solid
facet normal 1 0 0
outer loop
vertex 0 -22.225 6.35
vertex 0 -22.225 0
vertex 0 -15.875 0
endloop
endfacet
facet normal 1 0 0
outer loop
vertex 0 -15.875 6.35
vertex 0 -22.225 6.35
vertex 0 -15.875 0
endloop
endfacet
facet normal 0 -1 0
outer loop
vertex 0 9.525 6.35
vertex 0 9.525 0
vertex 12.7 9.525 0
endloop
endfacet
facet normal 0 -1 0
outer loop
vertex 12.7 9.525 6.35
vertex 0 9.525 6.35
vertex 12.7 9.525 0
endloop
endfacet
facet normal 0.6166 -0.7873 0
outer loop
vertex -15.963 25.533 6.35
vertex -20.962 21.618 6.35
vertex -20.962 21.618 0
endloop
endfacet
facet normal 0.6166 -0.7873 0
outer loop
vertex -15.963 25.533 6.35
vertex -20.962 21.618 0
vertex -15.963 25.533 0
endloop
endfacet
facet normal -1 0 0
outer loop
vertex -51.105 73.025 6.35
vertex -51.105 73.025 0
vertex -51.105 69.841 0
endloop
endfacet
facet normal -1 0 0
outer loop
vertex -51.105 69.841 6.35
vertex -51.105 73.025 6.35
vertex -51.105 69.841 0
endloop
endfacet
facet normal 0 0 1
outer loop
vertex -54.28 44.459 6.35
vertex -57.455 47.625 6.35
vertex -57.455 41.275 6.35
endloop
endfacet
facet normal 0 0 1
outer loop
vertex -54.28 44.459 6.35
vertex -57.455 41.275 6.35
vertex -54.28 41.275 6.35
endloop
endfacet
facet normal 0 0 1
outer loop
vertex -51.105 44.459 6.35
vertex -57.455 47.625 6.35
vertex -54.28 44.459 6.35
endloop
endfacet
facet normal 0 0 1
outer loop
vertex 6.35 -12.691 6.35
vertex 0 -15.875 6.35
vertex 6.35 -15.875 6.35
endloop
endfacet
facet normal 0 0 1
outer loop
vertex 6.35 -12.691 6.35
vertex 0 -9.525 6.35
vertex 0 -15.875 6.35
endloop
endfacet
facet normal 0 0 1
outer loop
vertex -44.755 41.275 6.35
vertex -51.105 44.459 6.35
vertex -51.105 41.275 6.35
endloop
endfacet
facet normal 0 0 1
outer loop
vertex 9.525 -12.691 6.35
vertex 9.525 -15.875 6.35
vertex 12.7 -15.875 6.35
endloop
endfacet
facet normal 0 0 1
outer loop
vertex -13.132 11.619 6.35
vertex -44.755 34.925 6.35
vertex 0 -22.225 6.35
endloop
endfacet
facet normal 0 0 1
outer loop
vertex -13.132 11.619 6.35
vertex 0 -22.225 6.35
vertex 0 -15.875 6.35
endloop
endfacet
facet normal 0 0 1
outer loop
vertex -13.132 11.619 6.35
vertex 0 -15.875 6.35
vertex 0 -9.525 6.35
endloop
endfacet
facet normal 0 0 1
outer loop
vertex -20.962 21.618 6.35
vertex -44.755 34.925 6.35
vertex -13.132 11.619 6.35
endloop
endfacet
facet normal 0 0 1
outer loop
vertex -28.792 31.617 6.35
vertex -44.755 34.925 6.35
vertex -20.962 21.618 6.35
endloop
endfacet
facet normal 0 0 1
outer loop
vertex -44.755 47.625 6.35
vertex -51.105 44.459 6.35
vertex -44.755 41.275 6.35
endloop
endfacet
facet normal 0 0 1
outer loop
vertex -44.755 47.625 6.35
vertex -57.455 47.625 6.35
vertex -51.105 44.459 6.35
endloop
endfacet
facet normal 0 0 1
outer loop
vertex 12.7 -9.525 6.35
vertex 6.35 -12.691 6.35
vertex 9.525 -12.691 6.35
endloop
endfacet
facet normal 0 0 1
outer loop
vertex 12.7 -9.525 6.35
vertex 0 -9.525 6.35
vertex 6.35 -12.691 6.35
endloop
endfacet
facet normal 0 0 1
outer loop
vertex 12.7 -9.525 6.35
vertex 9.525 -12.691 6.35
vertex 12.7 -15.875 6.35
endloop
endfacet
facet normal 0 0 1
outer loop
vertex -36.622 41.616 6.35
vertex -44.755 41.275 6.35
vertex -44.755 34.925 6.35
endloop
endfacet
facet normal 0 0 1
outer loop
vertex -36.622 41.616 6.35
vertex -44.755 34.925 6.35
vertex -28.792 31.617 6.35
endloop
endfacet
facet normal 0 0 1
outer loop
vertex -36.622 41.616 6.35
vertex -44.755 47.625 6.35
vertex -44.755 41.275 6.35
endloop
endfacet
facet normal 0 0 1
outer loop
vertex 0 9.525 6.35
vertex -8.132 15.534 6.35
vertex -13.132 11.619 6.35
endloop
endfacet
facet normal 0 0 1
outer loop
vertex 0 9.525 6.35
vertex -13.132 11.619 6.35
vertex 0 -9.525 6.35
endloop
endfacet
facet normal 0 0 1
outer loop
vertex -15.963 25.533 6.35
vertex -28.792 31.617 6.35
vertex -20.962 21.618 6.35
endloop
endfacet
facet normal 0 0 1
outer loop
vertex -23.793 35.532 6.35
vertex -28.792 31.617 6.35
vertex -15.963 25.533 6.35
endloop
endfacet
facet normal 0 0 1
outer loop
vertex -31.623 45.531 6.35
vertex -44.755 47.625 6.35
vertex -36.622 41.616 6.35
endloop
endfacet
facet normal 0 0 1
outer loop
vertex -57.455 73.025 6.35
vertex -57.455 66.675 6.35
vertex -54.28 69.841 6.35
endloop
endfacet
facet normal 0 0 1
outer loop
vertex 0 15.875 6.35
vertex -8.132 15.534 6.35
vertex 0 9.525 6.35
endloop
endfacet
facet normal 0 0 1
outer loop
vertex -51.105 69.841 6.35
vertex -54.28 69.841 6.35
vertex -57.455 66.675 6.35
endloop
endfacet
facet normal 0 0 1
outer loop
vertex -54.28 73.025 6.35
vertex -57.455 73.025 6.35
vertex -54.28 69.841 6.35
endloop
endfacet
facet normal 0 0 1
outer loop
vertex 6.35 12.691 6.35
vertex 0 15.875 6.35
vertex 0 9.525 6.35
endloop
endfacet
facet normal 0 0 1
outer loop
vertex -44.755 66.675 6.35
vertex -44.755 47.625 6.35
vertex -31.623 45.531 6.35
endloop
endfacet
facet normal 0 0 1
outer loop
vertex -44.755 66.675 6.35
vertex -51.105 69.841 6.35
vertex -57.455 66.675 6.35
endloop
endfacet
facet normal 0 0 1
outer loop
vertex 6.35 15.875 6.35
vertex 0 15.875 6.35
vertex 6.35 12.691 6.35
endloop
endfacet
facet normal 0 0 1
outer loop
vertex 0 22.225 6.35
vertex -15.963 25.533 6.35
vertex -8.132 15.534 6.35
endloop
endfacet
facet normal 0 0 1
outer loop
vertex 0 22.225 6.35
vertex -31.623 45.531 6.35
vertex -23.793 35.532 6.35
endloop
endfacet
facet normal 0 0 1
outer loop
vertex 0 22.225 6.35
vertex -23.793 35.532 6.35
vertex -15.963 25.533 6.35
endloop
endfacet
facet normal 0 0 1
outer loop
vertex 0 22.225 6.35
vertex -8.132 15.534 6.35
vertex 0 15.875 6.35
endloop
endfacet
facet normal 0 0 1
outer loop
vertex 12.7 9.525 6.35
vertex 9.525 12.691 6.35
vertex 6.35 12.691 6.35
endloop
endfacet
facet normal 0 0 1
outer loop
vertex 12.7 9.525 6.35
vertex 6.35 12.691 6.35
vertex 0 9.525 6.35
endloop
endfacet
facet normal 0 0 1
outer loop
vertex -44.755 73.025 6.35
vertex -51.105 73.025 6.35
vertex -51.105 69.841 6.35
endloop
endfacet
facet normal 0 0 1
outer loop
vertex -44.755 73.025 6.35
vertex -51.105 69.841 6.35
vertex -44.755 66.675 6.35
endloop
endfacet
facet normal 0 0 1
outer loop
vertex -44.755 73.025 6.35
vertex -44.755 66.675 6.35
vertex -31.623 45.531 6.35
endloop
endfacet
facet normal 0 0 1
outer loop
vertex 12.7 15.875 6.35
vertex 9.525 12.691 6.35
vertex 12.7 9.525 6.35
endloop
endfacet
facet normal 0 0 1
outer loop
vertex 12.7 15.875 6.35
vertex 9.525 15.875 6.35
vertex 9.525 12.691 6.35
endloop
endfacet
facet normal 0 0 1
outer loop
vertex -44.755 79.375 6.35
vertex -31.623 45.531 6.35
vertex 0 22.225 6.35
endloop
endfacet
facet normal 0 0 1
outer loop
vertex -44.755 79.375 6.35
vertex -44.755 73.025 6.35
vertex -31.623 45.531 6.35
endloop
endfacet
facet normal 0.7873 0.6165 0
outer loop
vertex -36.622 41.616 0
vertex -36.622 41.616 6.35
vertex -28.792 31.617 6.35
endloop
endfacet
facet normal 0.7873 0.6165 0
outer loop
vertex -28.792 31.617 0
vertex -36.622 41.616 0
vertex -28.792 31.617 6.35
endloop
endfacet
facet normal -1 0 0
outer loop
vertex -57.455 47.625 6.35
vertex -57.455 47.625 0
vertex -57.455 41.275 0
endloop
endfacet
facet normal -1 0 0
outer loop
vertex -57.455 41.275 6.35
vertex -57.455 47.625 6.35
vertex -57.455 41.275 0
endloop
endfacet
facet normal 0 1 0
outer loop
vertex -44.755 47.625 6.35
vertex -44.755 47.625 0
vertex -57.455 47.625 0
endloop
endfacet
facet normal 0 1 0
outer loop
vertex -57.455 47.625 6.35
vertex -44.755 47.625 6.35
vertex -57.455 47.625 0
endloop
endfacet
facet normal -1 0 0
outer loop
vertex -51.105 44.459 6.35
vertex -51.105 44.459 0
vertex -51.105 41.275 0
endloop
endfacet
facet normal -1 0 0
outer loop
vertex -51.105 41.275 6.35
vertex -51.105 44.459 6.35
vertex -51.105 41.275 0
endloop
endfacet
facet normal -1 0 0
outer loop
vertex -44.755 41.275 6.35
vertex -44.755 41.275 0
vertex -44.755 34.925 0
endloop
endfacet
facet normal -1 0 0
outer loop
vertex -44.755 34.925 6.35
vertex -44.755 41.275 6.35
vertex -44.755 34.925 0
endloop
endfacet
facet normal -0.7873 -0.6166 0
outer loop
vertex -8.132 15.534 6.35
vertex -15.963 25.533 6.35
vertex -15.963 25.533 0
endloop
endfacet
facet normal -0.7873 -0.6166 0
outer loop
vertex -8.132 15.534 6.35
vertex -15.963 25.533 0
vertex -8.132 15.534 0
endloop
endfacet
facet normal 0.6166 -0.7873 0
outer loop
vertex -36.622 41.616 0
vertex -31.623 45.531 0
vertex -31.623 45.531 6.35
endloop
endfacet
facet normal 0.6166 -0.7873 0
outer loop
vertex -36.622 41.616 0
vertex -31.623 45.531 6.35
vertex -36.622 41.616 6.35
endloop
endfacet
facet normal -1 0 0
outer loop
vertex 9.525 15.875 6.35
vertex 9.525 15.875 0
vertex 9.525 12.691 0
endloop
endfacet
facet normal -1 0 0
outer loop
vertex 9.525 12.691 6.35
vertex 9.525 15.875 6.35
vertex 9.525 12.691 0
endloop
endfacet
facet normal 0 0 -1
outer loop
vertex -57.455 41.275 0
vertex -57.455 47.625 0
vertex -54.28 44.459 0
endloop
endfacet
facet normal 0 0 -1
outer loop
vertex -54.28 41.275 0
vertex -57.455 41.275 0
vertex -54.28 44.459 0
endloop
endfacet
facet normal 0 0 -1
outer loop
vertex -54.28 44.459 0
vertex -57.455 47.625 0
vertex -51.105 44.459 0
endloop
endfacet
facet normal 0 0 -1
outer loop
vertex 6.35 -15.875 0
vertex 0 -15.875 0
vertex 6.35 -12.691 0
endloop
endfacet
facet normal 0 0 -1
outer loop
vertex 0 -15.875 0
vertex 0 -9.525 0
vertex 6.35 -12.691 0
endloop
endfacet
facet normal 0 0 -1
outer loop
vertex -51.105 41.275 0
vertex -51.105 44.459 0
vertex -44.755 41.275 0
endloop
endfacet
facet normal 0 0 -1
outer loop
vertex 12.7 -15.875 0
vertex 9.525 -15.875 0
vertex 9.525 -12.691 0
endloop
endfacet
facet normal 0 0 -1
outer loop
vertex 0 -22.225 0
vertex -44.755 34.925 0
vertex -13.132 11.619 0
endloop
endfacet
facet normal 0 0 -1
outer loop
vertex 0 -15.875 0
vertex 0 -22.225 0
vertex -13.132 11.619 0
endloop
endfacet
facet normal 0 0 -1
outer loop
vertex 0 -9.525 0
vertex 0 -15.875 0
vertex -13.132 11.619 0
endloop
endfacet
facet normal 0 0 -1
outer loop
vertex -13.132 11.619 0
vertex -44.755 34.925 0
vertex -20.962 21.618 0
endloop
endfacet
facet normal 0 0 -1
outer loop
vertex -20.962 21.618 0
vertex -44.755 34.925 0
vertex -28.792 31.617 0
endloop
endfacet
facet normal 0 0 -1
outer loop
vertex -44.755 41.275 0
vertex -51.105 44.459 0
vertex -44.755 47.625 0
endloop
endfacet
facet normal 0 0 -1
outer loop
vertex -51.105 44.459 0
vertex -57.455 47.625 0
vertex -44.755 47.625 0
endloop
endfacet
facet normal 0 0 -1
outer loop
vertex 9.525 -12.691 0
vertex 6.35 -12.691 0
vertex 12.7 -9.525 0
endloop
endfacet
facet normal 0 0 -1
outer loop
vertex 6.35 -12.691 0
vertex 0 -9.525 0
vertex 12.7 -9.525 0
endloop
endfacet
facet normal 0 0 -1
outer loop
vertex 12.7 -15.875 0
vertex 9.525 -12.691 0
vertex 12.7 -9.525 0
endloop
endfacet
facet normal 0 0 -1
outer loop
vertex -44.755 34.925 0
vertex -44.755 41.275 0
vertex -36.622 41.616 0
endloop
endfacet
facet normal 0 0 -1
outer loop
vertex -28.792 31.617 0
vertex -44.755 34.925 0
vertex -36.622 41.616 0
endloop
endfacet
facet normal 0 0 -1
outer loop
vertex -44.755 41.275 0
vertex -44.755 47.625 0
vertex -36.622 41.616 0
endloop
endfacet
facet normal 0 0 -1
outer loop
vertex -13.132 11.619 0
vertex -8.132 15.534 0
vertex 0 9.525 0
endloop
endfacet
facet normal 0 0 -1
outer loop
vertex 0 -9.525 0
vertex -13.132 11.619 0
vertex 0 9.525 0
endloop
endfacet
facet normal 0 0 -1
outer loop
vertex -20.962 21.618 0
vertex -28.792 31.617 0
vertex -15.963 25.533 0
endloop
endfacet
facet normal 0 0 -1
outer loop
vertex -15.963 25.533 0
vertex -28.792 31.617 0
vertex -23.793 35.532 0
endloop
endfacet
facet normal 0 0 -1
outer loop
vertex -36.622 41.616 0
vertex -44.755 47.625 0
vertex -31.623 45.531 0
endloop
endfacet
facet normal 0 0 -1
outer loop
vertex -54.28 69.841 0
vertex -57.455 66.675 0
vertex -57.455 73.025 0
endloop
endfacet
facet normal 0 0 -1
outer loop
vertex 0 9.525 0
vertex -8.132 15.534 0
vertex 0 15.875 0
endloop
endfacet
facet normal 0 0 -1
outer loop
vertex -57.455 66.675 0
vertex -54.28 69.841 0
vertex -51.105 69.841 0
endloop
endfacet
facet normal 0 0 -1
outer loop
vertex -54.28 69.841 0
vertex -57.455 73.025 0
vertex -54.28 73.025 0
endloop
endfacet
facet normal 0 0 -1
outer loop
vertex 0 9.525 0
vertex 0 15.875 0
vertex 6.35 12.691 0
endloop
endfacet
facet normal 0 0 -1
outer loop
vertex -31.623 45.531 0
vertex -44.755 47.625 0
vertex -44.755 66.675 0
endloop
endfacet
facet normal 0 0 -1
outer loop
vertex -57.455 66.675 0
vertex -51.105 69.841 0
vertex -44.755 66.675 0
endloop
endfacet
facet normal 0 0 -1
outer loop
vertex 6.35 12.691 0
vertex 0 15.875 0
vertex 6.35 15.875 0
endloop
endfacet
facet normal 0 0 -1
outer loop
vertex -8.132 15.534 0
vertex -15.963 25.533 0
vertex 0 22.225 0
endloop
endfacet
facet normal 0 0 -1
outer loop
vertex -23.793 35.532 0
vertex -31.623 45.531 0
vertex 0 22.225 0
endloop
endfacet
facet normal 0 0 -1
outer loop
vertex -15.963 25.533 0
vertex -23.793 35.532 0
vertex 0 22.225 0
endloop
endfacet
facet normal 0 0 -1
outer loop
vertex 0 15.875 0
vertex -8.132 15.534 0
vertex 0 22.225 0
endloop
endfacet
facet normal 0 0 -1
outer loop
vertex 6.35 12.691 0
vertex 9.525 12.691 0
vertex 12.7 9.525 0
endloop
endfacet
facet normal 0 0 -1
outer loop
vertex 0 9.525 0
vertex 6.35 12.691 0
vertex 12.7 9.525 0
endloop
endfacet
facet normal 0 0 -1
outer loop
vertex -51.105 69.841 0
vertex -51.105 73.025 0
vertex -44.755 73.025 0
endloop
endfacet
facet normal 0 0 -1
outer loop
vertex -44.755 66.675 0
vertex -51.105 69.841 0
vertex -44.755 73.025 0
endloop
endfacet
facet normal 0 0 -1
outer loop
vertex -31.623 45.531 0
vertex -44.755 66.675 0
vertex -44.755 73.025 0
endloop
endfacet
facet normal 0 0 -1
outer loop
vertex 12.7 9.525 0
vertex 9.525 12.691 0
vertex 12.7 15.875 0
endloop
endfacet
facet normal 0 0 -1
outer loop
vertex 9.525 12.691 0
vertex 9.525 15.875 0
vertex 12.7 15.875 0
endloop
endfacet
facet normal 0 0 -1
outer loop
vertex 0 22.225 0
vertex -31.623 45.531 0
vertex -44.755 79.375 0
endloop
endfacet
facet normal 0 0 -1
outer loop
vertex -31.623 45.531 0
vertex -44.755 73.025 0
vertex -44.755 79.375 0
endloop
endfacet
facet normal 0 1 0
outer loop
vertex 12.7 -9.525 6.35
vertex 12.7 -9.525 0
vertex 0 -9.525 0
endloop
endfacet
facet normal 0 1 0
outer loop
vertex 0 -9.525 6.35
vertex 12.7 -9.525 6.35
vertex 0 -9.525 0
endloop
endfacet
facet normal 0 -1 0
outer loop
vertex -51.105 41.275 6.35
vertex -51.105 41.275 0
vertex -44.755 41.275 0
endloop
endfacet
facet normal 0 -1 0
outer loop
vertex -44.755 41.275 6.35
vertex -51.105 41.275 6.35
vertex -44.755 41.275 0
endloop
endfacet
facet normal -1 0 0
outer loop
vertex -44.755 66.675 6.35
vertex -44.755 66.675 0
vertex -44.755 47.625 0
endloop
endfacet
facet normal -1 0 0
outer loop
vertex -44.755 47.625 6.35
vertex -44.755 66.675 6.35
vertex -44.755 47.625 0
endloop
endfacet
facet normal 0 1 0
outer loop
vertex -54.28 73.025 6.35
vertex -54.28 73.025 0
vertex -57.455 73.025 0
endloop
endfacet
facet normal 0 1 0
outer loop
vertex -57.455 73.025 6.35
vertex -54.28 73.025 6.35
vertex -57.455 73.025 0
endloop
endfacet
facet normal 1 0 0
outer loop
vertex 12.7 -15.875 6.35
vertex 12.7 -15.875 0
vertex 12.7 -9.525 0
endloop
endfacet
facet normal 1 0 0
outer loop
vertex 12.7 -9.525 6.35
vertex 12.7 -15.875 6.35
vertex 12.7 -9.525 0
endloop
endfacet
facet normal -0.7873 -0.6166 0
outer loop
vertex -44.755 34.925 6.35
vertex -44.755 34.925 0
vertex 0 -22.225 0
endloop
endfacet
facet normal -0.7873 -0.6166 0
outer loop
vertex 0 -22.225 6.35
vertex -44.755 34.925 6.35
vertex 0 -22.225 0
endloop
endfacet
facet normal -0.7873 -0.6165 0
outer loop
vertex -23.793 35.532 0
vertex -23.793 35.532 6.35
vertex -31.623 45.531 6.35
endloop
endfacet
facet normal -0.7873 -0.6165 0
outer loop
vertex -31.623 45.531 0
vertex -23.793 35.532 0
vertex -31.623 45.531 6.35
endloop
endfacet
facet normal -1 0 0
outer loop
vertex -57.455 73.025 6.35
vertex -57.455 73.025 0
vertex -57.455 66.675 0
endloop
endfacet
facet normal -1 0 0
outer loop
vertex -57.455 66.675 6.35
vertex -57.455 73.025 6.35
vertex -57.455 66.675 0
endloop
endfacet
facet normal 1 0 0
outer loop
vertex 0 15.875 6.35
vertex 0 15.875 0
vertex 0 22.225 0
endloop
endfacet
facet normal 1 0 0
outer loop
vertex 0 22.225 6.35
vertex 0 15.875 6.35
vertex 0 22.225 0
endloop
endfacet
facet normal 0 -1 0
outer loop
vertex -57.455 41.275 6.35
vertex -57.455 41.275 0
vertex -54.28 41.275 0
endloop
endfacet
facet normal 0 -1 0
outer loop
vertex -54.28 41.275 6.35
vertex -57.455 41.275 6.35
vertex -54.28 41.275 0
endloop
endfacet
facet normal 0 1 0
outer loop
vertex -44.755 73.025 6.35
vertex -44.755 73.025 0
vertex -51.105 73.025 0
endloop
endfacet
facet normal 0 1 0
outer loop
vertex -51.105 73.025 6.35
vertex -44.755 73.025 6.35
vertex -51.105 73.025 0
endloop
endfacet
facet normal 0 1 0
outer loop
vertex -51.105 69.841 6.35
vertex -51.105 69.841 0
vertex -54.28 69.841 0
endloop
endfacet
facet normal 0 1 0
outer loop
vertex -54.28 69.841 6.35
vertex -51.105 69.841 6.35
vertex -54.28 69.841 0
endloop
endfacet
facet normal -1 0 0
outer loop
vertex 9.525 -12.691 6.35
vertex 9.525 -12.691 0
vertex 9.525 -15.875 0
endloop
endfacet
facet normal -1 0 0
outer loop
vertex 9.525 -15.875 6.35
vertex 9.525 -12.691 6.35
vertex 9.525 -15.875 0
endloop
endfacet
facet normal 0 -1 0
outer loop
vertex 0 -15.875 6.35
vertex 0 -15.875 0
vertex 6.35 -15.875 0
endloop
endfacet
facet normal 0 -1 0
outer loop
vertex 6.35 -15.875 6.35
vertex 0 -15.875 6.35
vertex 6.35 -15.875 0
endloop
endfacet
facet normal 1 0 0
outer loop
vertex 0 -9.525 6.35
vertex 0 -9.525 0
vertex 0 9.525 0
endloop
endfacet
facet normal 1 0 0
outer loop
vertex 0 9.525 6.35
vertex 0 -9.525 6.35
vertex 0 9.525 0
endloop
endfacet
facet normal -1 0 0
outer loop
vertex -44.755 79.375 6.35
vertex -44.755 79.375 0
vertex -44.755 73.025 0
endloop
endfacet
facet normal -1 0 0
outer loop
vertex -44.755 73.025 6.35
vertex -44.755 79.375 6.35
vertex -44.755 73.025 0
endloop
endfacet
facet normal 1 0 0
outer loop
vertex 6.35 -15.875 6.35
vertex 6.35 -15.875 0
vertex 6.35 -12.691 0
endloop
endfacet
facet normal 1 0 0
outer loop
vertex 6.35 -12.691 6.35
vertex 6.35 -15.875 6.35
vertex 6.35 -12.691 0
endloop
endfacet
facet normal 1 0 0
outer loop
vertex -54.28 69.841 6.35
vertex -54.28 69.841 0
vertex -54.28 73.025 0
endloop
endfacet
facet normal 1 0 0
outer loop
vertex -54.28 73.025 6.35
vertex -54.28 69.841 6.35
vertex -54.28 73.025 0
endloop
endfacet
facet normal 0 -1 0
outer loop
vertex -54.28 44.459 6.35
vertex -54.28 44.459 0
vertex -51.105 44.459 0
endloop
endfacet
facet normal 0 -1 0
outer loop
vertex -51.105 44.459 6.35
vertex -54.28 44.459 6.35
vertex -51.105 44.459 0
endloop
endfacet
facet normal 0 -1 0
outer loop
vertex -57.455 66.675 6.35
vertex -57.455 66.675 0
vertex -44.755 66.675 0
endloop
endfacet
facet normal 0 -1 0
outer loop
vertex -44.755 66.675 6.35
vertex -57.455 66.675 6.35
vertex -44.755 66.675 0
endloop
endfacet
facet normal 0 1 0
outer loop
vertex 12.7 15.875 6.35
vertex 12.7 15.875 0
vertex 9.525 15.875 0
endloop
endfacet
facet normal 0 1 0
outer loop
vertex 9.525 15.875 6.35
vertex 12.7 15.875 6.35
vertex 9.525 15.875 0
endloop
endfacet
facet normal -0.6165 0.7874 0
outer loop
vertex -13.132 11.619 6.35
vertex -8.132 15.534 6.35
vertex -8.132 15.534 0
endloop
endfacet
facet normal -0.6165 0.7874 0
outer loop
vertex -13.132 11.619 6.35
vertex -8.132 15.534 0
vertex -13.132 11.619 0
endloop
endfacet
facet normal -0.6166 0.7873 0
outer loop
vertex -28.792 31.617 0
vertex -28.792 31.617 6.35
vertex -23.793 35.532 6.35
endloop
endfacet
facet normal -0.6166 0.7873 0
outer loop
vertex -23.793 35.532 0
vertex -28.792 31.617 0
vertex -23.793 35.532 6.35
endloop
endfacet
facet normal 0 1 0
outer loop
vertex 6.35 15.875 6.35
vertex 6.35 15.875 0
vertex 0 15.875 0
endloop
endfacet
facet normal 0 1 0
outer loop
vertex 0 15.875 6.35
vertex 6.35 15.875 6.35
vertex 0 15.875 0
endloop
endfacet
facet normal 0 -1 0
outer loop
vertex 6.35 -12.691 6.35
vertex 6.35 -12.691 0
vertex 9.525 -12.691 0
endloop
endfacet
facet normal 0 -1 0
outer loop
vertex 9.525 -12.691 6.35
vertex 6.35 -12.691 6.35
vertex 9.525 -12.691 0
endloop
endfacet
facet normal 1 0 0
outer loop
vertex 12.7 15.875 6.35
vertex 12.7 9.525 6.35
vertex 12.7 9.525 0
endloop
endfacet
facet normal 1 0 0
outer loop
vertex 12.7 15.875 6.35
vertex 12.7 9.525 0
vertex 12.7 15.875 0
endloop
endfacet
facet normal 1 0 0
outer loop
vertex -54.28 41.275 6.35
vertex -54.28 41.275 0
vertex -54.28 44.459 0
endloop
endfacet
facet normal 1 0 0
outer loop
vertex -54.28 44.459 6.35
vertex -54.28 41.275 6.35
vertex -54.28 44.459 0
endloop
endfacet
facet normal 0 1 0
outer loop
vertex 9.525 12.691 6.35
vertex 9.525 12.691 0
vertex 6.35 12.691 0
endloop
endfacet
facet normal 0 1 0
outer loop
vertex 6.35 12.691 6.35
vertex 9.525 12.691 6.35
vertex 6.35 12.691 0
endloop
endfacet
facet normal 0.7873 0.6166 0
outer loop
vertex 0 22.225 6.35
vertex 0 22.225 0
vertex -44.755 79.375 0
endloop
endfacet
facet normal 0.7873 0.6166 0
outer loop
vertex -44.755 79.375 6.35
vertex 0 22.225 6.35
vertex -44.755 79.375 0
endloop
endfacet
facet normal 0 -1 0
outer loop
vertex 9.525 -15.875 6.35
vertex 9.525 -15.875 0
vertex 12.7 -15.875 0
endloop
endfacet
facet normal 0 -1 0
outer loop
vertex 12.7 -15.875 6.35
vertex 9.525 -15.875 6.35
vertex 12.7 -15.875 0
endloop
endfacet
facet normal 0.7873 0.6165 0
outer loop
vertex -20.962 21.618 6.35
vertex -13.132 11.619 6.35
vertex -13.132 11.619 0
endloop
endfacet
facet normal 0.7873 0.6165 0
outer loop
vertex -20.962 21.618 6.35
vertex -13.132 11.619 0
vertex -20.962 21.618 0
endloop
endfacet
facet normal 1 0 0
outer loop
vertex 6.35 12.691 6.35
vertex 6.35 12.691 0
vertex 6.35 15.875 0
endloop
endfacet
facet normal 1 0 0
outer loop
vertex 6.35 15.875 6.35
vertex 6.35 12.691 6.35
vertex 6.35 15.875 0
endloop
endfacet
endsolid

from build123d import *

# Parameters (mm, degrees)
PROFILE_DEPTH      = 6.35
CUT_EXTRUDE1_DEPTH = 99.192500569


with BuildPart() as part:
    # Sketch1 → Profile (new body)
    with BuildSketch(Plane.XY):
        Polygon((-44.7548, 79.375), (-44.7548, 73.025), (-51.1048, 73.025), (-51.1048, 69.841302271), (-54.2798, 69.841302271), (-54.2798, 73.025), (-57.4548, 73.025), (-57.4548, 66.675), (-44.7548, 66.675), (-44.7548, 47.625), (-57.4548, 47.625), (-57.4548, 41.275), (-54.2798, 41.275), (-54.2798, 44.458697729), (-51.1048, 44.458697729), (-51.1048, 41.275), (-44.7548, 41.275), (-44.7548, 34.925), (0, -22.225), (0, -15.875), (6.35, -15.875), (6.35, -12.691302271), (9.525, -12.691302271), (9.525, -15.875), (12.7, -15.875), (12.7, -9.525), (0, -9.525), (0, 9.525), (12.7, 9.525), (12.7, 15.875), (9.525, 15.875), (9.525, 12.691302271), (6.35, 12.691302271), (6.35, 15.875), (0, 15.875), (0, 22.225), align=None)
    extrude(amount=PROFILE_DEPTH)

    # Sketch2 → Cut-Extrude1 (cut, through all)
    with BuildSketch(Plane.XY.offset(6.35)):
        Polygon((-31.623026277, 45.530869772), (-36.622463702, 41.615754776), (-28.792233709, 31.616879926), (-23.792796284, 35.531994923), align=None)
        Polygon((-15.962566291, 25.533120074), (-8.132336298, 15.534245224), (-13.131773723, 11.619130228), (-20.962003716, 21.618005077), align=None)
    extrude(amount=-CUT_EXTRUDE1_DEPTH, mode=Mode.SUBTRACT)


solid = part.part
